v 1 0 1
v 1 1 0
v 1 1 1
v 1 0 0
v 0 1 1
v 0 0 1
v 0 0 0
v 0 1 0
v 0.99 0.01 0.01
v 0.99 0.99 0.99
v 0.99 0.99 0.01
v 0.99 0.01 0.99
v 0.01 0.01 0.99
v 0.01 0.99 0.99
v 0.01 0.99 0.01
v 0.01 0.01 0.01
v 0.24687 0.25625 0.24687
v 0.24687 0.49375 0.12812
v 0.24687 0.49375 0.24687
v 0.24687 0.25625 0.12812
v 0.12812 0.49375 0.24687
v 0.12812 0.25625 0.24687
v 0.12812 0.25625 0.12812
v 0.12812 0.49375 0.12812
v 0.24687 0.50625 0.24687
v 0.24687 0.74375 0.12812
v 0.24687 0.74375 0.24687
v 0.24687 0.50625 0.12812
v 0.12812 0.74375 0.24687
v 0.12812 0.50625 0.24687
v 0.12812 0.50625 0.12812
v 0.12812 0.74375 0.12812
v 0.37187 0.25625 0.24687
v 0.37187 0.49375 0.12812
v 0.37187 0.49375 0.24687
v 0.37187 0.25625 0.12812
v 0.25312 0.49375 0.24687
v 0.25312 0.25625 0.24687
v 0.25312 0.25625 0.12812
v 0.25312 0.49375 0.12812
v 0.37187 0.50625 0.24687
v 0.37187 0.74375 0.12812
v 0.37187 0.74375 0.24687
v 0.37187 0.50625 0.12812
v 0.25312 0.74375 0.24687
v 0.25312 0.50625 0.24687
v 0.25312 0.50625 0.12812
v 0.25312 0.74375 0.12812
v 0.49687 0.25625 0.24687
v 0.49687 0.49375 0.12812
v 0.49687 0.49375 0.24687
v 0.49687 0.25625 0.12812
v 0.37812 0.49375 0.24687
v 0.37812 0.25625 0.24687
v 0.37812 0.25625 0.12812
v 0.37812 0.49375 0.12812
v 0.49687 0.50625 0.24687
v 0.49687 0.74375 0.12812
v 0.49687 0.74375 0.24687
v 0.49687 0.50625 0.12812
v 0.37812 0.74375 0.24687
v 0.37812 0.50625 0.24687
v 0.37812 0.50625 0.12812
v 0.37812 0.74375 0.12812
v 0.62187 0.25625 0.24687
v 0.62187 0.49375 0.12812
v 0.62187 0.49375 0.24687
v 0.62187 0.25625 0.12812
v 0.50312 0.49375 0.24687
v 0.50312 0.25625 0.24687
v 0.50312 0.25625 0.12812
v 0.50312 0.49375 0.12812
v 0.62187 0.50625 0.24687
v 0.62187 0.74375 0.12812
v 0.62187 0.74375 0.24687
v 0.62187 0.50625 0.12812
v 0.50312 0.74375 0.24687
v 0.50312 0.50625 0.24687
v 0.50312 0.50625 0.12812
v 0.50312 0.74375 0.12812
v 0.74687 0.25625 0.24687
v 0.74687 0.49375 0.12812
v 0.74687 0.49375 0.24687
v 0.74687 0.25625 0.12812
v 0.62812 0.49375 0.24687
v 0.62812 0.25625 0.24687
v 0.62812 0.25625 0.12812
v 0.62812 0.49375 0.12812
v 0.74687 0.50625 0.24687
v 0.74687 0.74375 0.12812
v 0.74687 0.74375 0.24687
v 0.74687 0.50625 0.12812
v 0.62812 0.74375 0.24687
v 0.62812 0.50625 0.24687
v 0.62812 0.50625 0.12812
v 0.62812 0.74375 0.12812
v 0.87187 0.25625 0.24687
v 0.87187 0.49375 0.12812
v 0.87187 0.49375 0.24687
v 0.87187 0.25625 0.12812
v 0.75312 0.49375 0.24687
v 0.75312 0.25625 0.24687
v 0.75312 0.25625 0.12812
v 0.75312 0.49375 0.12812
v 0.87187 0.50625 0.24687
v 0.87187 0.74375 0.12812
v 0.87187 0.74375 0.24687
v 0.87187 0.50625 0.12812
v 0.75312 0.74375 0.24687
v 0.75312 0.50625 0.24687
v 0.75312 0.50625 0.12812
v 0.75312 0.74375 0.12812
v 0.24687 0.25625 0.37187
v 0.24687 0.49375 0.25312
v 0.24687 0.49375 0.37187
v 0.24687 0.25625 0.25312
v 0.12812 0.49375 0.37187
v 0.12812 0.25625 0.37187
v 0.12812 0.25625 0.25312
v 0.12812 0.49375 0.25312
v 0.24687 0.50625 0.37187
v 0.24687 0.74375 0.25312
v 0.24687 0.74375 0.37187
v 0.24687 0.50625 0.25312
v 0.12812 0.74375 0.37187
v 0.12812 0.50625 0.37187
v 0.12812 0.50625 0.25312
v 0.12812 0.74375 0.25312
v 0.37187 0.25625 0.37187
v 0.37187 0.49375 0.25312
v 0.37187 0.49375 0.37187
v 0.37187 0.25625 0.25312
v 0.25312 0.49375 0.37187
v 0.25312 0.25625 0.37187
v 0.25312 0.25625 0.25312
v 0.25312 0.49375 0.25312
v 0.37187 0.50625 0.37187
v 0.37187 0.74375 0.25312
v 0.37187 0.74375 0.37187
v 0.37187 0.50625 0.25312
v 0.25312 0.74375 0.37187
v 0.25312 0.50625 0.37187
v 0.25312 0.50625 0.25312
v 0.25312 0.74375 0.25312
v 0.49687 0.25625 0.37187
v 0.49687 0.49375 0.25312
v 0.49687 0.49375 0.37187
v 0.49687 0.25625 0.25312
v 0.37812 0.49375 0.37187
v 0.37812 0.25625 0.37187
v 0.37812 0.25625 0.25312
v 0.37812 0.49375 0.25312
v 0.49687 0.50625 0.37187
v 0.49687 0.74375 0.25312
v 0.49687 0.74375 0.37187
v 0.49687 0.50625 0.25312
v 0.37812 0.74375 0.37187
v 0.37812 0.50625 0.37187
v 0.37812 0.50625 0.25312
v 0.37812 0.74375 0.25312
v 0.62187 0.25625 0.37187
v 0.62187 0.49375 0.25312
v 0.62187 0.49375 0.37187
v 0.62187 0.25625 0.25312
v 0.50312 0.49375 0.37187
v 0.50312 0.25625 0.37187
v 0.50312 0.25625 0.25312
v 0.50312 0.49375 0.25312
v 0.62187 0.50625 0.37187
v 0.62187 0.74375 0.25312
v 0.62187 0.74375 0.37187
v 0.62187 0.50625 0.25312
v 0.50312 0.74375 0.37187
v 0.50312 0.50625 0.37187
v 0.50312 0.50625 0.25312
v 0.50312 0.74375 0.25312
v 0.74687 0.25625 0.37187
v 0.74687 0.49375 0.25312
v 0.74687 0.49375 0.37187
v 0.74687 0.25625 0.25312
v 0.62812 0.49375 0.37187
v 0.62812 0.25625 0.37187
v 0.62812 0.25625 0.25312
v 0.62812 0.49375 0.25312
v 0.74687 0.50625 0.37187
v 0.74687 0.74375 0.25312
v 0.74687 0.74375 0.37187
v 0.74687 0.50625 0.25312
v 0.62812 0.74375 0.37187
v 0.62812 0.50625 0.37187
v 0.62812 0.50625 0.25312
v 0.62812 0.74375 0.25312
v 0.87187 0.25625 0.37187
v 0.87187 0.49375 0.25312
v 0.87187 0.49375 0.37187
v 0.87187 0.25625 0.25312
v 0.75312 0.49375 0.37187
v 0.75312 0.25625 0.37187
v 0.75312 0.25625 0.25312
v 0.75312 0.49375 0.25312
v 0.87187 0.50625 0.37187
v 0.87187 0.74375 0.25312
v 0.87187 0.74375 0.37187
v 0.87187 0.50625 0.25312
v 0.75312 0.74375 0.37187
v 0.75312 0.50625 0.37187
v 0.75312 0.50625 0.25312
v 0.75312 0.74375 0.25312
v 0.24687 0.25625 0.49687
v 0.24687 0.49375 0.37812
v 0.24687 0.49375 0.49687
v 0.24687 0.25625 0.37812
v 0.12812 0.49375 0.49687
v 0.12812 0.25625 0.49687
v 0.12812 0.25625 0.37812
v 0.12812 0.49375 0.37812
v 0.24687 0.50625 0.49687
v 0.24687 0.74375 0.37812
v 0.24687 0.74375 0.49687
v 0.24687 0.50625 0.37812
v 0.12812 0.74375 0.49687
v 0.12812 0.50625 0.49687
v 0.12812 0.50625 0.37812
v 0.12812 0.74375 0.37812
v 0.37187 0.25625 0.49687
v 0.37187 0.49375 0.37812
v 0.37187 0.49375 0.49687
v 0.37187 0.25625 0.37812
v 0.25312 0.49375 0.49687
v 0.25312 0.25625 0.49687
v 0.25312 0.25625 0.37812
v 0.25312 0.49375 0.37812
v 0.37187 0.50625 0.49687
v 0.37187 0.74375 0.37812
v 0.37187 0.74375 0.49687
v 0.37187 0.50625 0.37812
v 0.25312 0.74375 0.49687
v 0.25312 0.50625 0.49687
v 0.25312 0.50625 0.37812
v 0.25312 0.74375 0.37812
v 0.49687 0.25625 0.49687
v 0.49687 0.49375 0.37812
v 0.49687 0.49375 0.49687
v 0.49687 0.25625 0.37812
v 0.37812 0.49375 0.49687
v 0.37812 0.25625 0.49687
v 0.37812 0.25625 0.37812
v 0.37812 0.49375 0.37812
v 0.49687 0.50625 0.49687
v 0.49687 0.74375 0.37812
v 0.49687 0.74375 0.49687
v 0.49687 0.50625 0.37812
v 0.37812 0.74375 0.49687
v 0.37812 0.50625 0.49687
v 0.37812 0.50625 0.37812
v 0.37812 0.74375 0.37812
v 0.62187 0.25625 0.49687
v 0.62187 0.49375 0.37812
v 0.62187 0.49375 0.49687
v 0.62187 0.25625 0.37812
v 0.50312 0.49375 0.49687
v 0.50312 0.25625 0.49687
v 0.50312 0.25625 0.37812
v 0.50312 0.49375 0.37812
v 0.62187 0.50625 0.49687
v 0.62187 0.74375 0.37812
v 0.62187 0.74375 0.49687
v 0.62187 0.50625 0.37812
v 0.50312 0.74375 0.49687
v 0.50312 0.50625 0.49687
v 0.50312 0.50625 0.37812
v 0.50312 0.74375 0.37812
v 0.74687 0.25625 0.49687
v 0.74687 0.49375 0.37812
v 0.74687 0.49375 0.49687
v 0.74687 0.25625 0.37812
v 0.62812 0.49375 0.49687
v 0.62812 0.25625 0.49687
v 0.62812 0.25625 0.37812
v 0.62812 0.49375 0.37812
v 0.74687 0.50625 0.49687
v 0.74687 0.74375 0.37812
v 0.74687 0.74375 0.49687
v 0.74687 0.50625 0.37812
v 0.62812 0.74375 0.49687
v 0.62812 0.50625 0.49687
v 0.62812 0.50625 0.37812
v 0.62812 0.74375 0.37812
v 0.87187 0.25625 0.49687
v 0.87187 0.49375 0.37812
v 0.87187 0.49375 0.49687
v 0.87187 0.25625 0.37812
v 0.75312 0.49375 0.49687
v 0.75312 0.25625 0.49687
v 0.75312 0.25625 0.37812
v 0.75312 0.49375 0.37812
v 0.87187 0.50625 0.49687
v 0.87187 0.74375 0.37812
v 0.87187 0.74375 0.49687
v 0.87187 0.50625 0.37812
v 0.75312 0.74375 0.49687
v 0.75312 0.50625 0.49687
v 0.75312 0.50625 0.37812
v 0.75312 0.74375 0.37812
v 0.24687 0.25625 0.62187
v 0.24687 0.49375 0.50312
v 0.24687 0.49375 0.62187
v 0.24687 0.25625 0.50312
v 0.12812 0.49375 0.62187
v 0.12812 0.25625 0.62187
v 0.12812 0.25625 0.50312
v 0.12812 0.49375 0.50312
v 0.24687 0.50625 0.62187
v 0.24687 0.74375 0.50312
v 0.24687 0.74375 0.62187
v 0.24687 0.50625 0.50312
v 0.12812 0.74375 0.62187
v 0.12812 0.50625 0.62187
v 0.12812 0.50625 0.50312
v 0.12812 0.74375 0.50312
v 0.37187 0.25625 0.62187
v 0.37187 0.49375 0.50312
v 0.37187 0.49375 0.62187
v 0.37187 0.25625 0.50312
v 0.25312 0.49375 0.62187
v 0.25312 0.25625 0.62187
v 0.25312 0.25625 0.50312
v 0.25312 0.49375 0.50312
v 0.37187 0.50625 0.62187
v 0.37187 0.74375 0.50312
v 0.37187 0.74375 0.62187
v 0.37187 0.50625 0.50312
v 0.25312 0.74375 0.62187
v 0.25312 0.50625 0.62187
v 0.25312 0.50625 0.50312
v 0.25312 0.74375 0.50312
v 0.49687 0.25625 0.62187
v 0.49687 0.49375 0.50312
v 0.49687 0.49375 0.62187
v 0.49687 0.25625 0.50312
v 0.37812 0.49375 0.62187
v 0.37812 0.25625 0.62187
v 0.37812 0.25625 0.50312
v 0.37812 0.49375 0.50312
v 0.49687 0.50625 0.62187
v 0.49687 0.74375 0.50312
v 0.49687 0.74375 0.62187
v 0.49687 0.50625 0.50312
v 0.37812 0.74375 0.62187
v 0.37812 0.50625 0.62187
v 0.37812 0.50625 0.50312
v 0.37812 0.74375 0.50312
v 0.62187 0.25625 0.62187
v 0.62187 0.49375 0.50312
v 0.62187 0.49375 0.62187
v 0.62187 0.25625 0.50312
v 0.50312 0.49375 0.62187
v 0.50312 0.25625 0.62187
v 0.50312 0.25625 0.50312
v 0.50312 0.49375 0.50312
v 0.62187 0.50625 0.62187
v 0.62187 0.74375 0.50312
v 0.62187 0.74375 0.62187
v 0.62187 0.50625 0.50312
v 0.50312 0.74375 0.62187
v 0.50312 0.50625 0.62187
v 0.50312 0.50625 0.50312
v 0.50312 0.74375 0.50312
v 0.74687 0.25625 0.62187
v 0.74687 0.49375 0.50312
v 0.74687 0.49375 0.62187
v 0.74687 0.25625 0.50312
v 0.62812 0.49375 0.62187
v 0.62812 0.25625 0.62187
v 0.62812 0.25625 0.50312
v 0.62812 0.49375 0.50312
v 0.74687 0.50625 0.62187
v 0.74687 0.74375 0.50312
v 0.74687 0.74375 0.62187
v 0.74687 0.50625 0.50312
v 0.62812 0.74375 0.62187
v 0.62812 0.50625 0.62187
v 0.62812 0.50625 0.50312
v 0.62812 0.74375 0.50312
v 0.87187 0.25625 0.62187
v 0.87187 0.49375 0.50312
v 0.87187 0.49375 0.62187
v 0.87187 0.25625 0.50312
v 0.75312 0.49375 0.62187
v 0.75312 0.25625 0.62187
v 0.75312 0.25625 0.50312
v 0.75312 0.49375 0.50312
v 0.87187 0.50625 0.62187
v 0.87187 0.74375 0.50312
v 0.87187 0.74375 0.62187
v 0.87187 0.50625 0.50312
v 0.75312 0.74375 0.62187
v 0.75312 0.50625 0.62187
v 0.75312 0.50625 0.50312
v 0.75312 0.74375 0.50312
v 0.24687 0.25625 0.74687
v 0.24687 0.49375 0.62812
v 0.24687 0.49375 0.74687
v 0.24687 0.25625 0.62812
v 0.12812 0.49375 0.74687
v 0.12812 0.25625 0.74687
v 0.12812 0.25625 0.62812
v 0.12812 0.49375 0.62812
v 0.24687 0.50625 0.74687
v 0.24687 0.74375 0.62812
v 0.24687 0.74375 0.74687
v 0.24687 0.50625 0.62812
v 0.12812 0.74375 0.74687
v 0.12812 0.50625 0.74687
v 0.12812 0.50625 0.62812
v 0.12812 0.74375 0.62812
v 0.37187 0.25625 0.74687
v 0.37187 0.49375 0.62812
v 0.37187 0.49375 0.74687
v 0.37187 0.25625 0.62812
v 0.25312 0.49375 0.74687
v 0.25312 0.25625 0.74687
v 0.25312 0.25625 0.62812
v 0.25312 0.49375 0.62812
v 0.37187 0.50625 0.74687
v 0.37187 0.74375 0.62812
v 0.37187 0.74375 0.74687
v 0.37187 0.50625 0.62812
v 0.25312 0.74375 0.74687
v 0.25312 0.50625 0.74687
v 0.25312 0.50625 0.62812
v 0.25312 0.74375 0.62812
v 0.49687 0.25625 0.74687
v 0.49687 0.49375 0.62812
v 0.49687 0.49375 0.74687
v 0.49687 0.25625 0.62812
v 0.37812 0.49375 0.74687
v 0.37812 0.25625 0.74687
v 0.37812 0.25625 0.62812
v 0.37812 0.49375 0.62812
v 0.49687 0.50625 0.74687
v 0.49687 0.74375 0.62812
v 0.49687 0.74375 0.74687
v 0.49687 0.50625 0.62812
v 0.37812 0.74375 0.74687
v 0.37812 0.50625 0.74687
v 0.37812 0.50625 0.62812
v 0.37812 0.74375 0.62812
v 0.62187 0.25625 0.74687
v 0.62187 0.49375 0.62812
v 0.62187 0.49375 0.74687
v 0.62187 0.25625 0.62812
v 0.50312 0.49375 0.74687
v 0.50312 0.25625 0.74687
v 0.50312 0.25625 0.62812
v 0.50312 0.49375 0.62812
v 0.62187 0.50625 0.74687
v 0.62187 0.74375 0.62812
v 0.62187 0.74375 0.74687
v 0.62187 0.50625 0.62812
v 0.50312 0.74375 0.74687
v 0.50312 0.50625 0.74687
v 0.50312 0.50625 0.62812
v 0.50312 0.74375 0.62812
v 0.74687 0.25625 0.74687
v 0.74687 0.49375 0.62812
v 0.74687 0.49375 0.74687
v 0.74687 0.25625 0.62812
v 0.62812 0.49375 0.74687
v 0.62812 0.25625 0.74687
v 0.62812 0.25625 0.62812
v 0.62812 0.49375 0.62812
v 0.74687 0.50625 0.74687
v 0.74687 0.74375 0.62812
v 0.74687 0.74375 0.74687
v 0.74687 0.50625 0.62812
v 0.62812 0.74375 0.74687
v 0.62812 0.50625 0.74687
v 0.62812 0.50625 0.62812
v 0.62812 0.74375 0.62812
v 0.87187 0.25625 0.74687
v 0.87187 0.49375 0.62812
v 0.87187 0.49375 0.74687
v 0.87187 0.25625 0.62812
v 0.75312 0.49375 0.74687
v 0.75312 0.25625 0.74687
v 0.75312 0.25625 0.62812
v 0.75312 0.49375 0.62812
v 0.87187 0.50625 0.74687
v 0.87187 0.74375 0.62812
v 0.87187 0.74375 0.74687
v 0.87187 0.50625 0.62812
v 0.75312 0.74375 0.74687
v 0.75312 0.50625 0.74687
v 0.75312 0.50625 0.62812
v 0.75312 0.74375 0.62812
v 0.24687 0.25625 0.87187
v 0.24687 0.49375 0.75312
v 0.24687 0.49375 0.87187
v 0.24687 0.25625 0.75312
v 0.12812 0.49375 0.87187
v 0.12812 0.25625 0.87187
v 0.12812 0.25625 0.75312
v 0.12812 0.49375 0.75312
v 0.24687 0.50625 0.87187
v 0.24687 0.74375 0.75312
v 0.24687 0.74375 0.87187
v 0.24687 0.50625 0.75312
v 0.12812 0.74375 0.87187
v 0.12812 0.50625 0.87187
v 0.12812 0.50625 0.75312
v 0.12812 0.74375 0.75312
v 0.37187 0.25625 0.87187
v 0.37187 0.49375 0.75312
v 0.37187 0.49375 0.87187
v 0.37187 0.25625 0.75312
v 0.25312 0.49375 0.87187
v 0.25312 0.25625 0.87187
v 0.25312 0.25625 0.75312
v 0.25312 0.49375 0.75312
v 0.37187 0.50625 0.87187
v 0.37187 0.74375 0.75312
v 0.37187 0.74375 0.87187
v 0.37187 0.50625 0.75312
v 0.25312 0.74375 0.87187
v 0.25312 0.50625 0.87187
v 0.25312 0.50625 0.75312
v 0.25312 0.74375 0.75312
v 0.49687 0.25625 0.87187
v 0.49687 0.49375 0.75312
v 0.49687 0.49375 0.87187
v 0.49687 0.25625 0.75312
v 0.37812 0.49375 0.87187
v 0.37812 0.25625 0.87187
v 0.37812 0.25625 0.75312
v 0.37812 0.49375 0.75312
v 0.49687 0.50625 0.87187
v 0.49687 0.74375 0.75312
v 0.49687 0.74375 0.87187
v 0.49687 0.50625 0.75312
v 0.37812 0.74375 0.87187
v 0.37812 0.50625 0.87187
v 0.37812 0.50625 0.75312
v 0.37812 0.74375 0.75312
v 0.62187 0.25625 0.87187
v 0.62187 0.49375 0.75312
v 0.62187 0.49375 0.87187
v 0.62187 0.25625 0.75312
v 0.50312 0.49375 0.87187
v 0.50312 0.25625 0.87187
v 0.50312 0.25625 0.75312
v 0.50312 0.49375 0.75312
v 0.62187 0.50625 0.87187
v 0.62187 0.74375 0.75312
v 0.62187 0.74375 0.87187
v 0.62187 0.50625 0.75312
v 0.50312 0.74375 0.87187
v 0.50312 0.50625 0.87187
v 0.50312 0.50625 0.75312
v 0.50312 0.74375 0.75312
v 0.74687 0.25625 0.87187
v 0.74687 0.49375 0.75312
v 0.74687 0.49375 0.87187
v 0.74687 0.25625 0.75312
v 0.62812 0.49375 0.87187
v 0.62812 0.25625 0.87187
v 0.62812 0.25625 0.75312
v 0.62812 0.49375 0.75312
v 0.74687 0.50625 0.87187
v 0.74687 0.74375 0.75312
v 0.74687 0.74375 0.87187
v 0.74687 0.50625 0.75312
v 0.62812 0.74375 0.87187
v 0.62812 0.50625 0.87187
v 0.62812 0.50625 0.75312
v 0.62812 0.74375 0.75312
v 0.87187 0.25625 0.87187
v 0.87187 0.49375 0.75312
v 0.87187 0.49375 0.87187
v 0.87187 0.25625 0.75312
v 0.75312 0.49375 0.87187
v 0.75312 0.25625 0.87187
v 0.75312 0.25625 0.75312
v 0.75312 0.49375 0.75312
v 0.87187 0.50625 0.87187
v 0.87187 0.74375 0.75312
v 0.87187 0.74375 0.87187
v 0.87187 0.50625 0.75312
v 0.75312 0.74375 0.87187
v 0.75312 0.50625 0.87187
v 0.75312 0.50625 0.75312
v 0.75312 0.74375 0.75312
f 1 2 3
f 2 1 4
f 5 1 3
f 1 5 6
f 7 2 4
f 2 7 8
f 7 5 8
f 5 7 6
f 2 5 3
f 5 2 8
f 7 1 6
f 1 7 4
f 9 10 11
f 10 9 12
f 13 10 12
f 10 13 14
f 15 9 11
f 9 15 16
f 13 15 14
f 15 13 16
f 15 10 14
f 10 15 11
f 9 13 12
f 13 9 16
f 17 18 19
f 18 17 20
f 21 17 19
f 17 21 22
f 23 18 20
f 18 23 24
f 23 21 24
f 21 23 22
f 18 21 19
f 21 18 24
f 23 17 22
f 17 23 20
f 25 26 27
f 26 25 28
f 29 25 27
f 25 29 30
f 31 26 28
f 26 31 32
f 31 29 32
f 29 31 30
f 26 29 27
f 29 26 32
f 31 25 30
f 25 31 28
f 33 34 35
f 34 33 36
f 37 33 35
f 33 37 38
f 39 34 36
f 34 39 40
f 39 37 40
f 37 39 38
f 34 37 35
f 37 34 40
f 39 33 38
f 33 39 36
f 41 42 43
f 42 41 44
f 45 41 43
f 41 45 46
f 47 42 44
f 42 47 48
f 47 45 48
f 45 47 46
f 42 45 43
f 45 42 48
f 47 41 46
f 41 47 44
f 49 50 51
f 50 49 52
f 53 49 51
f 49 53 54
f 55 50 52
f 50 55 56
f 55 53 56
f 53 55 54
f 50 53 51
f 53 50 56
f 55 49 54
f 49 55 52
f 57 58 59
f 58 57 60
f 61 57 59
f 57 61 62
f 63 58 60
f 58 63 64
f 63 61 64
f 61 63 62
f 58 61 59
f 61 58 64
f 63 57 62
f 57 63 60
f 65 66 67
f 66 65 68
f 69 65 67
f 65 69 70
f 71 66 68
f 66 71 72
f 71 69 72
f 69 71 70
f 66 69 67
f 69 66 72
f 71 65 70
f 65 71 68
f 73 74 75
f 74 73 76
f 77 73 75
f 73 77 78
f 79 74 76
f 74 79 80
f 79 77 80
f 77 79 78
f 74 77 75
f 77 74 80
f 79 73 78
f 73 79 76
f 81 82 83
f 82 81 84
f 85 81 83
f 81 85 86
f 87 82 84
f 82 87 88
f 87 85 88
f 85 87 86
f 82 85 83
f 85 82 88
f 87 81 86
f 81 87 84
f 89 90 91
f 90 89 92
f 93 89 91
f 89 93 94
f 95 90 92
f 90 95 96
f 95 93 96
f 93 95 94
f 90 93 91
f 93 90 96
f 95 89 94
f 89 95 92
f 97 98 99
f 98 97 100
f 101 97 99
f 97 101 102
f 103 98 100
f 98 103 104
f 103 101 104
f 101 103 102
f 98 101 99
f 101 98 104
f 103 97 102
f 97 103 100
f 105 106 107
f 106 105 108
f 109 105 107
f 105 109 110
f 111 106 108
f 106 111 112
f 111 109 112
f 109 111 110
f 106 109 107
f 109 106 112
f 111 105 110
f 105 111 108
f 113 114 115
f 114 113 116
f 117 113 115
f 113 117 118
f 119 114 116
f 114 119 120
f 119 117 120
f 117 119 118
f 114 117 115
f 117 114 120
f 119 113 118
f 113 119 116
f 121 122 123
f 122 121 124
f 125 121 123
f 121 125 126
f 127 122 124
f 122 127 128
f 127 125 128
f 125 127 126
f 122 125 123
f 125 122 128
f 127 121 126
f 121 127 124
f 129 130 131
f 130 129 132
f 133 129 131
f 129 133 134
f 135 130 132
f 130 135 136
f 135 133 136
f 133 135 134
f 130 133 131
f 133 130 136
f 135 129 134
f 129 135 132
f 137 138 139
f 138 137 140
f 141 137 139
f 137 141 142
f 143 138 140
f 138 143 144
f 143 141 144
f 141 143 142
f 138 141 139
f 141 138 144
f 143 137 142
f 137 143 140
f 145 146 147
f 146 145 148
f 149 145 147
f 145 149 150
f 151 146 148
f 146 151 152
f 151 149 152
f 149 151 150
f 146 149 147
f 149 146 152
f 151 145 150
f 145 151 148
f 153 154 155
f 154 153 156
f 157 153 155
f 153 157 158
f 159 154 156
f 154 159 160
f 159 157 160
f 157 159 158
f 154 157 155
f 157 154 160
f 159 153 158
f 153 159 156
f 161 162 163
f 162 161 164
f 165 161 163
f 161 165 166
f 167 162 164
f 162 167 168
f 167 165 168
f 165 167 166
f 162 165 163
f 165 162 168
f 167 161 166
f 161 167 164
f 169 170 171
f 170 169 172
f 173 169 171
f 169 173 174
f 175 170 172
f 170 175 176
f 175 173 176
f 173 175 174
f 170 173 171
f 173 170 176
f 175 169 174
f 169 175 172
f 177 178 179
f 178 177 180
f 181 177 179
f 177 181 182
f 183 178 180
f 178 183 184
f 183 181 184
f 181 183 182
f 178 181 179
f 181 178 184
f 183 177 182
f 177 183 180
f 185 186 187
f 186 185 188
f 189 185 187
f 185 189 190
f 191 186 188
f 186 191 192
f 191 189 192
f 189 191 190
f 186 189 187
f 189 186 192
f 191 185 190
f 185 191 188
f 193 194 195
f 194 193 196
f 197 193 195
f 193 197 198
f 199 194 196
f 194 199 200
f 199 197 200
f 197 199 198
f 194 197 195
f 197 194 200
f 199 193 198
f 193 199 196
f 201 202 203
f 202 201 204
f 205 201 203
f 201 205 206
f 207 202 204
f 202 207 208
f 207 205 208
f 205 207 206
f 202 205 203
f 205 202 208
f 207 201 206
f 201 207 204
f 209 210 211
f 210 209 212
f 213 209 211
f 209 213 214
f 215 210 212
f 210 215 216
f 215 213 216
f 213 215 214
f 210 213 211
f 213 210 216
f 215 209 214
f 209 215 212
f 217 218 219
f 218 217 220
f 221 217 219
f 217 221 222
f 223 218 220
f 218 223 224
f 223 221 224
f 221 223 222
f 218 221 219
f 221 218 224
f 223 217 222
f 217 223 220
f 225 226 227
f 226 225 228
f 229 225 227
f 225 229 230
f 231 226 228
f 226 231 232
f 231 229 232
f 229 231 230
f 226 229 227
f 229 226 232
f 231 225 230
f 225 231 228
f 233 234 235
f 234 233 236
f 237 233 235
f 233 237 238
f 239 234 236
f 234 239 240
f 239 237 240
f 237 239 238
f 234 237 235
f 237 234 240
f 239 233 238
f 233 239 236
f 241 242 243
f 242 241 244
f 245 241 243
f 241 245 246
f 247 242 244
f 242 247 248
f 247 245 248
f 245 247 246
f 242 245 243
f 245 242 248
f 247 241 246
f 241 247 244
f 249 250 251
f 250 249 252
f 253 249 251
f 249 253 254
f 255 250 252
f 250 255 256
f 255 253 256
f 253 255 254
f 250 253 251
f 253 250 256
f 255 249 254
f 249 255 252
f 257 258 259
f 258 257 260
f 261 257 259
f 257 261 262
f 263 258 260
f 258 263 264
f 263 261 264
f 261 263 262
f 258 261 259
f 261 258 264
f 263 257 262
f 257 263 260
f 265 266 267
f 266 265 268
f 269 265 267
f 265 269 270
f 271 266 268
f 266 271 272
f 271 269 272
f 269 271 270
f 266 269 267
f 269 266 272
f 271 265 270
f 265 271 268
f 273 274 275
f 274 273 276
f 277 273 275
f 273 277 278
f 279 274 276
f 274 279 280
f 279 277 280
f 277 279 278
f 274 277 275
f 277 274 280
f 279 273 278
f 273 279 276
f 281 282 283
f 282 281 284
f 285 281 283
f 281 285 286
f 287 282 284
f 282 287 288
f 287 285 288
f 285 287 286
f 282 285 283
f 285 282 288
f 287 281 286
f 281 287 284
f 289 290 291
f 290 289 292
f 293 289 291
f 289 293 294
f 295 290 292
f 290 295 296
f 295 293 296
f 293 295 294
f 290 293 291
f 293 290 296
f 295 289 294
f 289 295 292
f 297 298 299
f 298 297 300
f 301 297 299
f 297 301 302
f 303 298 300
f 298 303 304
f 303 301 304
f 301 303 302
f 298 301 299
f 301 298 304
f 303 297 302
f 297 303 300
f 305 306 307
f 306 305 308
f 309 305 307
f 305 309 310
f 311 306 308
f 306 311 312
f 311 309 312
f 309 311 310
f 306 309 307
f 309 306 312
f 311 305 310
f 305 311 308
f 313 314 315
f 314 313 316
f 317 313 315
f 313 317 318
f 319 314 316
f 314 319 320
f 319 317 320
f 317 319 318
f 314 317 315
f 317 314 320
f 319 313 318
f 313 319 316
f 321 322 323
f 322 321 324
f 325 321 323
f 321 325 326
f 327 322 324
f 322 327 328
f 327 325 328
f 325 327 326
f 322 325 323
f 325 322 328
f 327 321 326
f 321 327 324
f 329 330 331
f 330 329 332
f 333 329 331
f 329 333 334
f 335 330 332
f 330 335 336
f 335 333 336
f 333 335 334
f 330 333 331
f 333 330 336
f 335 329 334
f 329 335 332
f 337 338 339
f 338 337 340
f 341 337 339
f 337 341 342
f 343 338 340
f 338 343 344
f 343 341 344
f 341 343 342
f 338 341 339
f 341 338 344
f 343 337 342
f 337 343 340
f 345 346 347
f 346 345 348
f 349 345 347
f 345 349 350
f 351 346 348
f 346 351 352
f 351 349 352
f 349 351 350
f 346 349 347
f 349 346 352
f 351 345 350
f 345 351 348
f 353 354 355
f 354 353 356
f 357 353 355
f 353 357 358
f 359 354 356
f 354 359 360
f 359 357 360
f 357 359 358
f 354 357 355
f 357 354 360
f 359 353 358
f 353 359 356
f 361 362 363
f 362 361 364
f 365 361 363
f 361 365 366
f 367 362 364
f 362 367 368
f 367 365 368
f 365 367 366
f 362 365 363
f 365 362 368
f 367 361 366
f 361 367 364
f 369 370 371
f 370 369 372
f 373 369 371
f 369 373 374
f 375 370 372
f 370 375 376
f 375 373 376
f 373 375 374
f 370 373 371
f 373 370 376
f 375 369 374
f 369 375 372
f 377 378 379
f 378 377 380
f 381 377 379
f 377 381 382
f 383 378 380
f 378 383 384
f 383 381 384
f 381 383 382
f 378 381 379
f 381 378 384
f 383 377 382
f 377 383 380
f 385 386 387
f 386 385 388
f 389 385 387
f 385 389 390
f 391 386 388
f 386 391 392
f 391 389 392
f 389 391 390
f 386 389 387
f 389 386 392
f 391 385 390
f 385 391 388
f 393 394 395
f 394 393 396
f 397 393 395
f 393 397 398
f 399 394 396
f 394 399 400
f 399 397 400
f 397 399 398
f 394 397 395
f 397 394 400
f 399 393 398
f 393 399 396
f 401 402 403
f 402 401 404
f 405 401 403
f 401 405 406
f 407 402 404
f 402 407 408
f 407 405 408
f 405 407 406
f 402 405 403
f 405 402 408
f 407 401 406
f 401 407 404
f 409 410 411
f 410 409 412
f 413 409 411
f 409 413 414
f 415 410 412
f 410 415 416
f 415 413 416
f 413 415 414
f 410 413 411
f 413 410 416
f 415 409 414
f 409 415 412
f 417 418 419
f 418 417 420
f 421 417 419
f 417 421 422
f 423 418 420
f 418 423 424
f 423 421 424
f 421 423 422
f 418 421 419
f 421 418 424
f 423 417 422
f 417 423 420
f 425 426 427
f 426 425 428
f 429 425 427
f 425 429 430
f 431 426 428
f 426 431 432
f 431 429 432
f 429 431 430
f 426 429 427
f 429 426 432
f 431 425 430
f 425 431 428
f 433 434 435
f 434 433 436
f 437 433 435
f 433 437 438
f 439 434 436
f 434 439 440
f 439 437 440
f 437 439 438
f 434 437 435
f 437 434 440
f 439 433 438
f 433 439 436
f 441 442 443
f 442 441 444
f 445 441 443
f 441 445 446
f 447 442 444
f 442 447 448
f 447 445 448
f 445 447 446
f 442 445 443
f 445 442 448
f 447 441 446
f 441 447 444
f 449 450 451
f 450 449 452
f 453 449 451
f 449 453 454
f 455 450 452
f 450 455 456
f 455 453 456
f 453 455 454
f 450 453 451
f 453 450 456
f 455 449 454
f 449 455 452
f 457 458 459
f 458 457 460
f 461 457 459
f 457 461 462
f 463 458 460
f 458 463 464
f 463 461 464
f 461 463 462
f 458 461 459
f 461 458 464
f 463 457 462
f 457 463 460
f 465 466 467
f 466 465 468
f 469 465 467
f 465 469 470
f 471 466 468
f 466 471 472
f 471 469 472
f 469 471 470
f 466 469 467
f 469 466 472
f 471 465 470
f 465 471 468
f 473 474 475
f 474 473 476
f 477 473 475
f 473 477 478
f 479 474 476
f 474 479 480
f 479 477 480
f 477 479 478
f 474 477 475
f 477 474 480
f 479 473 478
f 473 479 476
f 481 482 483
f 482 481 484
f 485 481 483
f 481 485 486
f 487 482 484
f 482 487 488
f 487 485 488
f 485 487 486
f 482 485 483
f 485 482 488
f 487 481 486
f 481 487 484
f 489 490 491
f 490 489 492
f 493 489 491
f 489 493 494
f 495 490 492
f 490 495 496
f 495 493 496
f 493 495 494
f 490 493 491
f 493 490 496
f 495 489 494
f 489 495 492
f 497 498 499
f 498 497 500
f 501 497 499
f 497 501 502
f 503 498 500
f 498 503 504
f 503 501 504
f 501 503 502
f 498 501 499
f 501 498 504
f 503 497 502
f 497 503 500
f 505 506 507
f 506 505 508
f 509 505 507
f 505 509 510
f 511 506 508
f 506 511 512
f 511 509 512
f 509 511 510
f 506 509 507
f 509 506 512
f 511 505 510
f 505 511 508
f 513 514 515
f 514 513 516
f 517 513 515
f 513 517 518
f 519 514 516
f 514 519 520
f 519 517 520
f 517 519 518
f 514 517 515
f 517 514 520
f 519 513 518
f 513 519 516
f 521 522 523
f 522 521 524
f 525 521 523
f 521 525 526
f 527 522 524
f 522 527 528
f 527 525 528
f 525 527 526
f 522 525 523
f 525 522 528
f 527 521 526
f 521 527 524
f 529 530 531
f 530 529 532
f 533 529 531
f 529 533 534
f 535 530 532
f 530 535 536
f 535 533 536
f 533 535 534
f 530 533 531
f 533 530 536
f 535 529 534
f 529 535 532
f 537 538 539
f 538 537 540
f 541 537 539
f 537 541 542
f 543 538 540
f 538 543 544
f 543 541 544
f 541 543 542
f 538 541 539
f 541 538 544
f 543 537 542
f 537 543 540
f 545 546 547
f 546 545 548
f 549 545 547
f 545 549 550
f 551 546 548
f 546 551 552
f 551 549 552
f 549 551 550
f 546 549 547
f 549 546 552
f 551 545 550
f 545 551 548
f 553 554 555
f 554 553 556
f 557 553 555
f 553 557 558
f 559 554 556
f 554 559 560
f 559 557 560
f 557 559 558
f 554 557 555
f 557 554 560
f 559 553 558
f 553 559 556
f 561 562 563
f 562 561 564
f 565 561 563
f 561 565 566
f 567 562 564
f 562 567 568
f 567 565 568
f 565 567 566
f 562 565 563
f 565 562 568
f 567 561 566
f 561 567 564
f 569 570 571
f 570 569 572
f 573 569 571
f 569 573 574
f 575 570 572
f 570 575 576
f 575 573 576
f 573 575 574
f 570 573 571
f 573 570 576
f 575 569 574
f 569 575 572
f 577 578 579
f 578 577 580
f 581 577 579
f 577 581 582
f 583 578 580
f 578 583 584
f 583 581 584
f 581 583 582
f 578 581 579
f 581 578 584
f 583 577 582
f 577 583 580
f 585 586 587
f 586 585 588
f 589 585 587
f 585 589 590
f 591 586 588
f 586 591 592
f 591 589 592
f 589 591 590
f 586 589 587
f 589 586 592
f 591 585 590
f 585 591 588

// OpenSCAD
translate([0.1875, 0.375, 0.1875]) color([0.5839405385485582, 0.4048698908705002, 0.6877557316706271]) cube([0.11875, 0.2375, 0.11875], center=true);
translate([0.1875, 0.625, 0.1875]) color([0.29310936231965135, 0.08456113000314536, 0.6409271470126323]) cube([0.11875, 0.2375, 0.11875], center=true);
translate([0.3125, 0.375, 0.1875]) color([0.38512246522478266, 0.6162859510128613, 0.407224705538046]) cube([0.11875, 0.2375, 0.11875], center=true);
translate([0.3125, 0.625, 0.1875]) color([0.6107800780239486, 0.9541913078580654, 0.09369719926319908]) cube([0.11875, 0.2375, 0.11875], center=true);
translate([0.4375, 0.375, 0.1875]) color([0.4396226851829427, 0.9817497074141792, 0.30111933510979894]) cube([0.11875, 0.2375, 0.11875], center=true);
translate([0.4375, 0.625, 0.1875]) color([0.08571041628526821, 0.691130580335744, 0.16573157374072334]) cube([0.11875, 0.2375, 0.11875], center=true);
translate([0.5625, 0.375, 0.1875]) color([0.4668304924867862, 0.30100213617539295, 0.3511677492745029]) cube([0.11875, 0.2375, 0.11875], center=true);
translate([0.5625, 0.625, 0.1875]) color([0.05564944269037686, 0.7696481469448815, 0.686275624239137]) cube([0.11875, 0.2375, 0.11875], center=true);
translate([0.6875, 0.375, 0.1875]) color([0.15447252119296884, 0.35335085758162643, 0.18799175914388588]) cube([0.11875, 0.2375, 0.11875], center=true);
translate([0.6875, 0.625, 0.1875]) color([0.41322879780265653, 0.82270842281296, 0.9057146612667819]) cube([0.11875, 0.2375, 0.11875], center=true);
translate([0.8125, 0.375, 0.1875]) color([0.9688547633127277, 0.5528378273263655, 0.12760284187612392]) cube([0.11875, 0.2375, 0.11875], center=true);
translate([0.8125, 0.625, 0.1875]) color([0.1710979555253146, 0.7131998843266452, 0.6397779425125977]) cube([0.11875, 0.2375, 0.11875], center=true);
translate([0.1875, 0.375, 0.3125]) color([0.57496968906483, 0.8489371230716904, 0.07944838941339594]) cube([0.11875, 0.2375, 0.11875], center=true);
translate([0.1875, 0.625, 0.3125]) color([0.040333123224873146, 0.9305910632054132, 0.3080440975445232]) cube([0.11875, 0.2375, 0.11875], center=true);
translate([0.3125, 0.375, 0.3125]) color([0.6084655882345898, 0.4923441190446234, 0.7069385087242315]) cube([0.11875, 0.2375, 0.11875], center=true);
translate([0.3125, 0.625, 0.3125]) color([0.6803385961846494, 0.18024793645131376, 0.10787678186317007]) cube([0.11875, 0.2375, 0.11875], center=true);
translate([0.4375, 0.375, 0.3125]) color([0.1335624130282893, 0.47731112778056706, 0.8393950916733898]) cube([0.11875, 0.2375, 0.11875], center=true);
translate([0.4375, 0.625, 0.3125]) color([0.6780893207968227, 0.08337096158279222, 0.27725115680544954]) cube([0.11875, 0.2375, 0.11875], center=true);
translate([0.5625, 0.375, 0.3125]) color([0.9965791662073833, 0.03375154870506614, 0.10494976972159242]) cube([0.11875, 0.2375, 0.11875], center=true);
translate([0.5625, 0.625, 0.3125]) color([0.516844917539197, 0.1360610465034362, 0.543805910213663]) cube([0.11875, 0.2375, 0.11875], center=true);
translate([0.6875, 0.375, 0.3125]) color([0.04901628196141694, 0.4867102513994055, 0.8813892002857401]) cube([0.11875, 0.2375, 0.11875], center=true);
translate([0.6875, 0.625, 0.3125]) color([0.3053751014353143, 0.40772022041766365, 0.31297204198076634]) cube([0.11875, 0.2375, 0.11875], center=true);
translate([0.8125, 0.375, 0.3125]) color([0.49907796034366436, 0.6160709555012981, 0.9916538905911245]) cube([0.11875, 0.2375, 0.11875], center=true);
translate([0.8125, 0.625, 0.3125]) color([0.3123575451593331, 0.46364206475662195, 0.8862899719975306]) cube([0.11875, 0.2375, 0.11875], center=true);
translate([0.1875, 0.375, 0.4375]) color([0.5738800220993816, 0.8494037217359881, 0.24323676398212035]) cube([0.11875, 0.2375, 0.11875], center=true);
translate([0.1875, 0.625, 0.4375]) color([0.8402878098664139, 0.9530478541805099, 0.16594803365564914]) cube([0.11875, 0.2375, 0.11875], center=true);
translate([0.3125, 0.375, 0.4375]) color([0.0023370868964924796, 0.7387895340607371, 0.5374530602666081]) cube([0.11875, 0.2375, 0.11875], center=true);
translate([0.3125, 0.625, 0.4375]) color([0.25604025835089217, 0.4320068924153808, 0.5112453323210508]) cube([0.11875, 0.2375, 0.11875], center=true);
translate([0.4375, 0.375, 0.4375]) color([0.7462272619347637, 0.5039790716190428, 0.8850839351693509]) cube([0.11875, 0.2375, 0.11875], center=true);
translate([0.4375, 0.625, 0.4375]) color([0.6652757233710683, 0.22263754843686523, 0.08942086350367451]) cube([0.11875, 0.2375, 0.11875], center=true);
translate([0.5625, 0.375, 0.4375]) color([0.6195232841458308, 0.9036720387350747, 0.7222923954673625]) cube([0.11875, 0.2375, 0.11875], center=true);
translate([0.5625, 0.625, 0.4375]) color([0.6665075097113882, 0.5421139713900744, 0.6943978877819516]) cube([0.11875, 0.2375, 0.11875], center=true);
translate([0.6875, 0.375, 0.4375]) color([0.9269770591996176, 0.12480324665016229, 0.8422397758241813]) cube([0.11875, 0.2375, 0.11875], center=true);
translate([0.6875, 0.625, 0.4375]) color([0.028249143050612435, 0.8554899328562455, 0.6212809598996976]) cube([0.11875, 0.2375, 0.11875], center=true);
translate([0.8125, 0.375, 0.4375]) color([0.6435486749275994, 0.4857227915978113, 0.2898251547629681]) cube([0.11875, 0.2375, 0.11875], center=true);
translate([0.8125, 0.625, 0.4375]) color([0.21709076393122206, 0.4979948584580751, 0.6176241526046676]) cube([0.11875, 0.2375, 0.11875], center=true);
translate([0.1875, 0.375, 0.5625]) color([0.4722249532281336, 0.7228331534363125, 0.6109414561657331]) cube([0.11875, 0.2375, 0.11875], center=true);
translate([0.1875, 0.625, 0.5625]) color([0.5330085163671737, 0.6769359871291822, 0.5973748769978083]) cube([0.11875, 0.2375, 0.11875], center=true);
translate([0.3125, 0.375, 0.5625]) color([0.14460255854654236, 0.21273280877313017, 0.8417179364881341]) cube([0.11875, 0.2375, 0.11875], center=true);
translate([0.3125, 0.625, 0.5625]) color([0.6300391880279899, 0.5103677782275869, 0.4479627161837708]) cube([0.11875, 0.2375, 0.11875], center=true);
translate([0.4375, 0.375, 0.5625]) color([0.2903518628620462, 0.1744676713524972, 0.5457372127765215]) cube([0.11875, 0.2375, 0.11875], center=true);
translate([0.4375, 0.625, 0.5625]) color([0.6340658375422632, 0.7004271366493812, 0.690956934786038]) cube([0.11875, 0.2375, 0.11875], center=true);
translate([0.5625, 0.375, 0.5625]) color([0.013948469234104865, 0.8018456354370093, 0.2607079205191076]) cube([0.11875, 0.2375, 0.11875], center=true);
translate([0.5625, 0.625, 0.5625]) color([0.01899716010339858, 0.7507132946374245, 0.44168653561511173]) cube([0.11875, 0.2375, 0.11875], center=true);
translate([0.6875, 0.375, 0.5625]) color([0.1668653701245908, 0.45955837321901094, 0.7876756969907556]) cube([0.11875, 0.2375, 0.11875], center=true);
translate([0.6875, 0.625, 0.5625]) color([0.09564527702692727, 0.06733136152719421, 0.7816649665975636]) cube([0.11875, 0.2375, 0.11875], center=true);
translate([0.8125, 0.375, 0.5625]) color([0.030385075649315252, 0.33346286891595733, 0.08647112242809318]) cube([0.11875, 0.2375, 0.11875], center=true);
translate([0.8125, 0.625, 0.5625]) color([0.8161439782233904, 0.05657658467482607, 0.8243668117903717]) cube([0.11875, 0.2375, 0.11875], center=true);
translate([0.1875, 0.375, 0.6875]) color([0.05808931884644186, 0.6181904095369413, 0.1426995958976538]) cube([0.11875, 0.2375, 0.11875], center=true);
translate([0.1875, 0.625, 0.6875]) color([0.3846464495954227, 0.3794414211645075, 0.7643773332264734]) cube([0.11875, 0.2375, 0.11875], center=true);
translate([0.3125, 0.375, 0.6875]) color([0.3116889002403487, 0.7690158776827113, 0.7674729074453902]) cube([0.11875, 0.2375, 0.11875], center=true);
translate([0.3125, 0.625, 0.6875]) color([0.3394448706328078, 0.45855440081433096, 0.0007502935671159783]) cube([0.11875, 0.2375, 0.11875], center=true);
translate([0.4375, 0.375, 0.6875]) color([0.8084995756647368, 0.0331322283588068, 0.9954935019736515]) cube([0.11875, 0.2375, 0.11875], center=true);
translate([0.4375, 0.625, 0.6875]) color([0.32750610520168044, 0.511786711221762, 0.09639677946248049]) cube([0.11875, 0.2375, 0.11875], center=true);
translate([0.5625, 0.375, 0.6875]) color([0.46647601470953737, 0.043404226035316795, 0.8089506697449751]) cube([0.11875, 0.2375, 0.11875], center=true);
translate([0.5625, 0.625, 0.6875]) color([0.9065579579370614, 0.48874197586323487, 0.4689182776921319]) cube([0.11875, 0.2375, 0.11875], center=true);
translate([0.6875, 0.375, 0.6875]) color([0.9999833648369341, 0.42392948264922625, 0.11056216143511133]) cube([0.11875, 0.2375, 0.11875], center=true);
translate([0.6875, 0.625, 0.6875]) color([0.5007484231317689, 0.23725843071495933, 0.7435751616565288]) cube([0.11875, 0.2375, 0.11875], center=true);
translate([0.8125, 0.375, 0.6875]) color([0.030326511183225713, 0.9534383365251057, 0.44454391677925087]) cube([0.11875, 0.2375, 0.11875], center=true);
translate([0.8125, 0.625, 0.6875]) color([0.4017260225039573, 0.6984802625757133, 0.14751428227125585]) cube([0.11875, 0.2375, 0.11875], center=true);
translate([0.1875, 0.375, 0.8125]) color([0.592053202978914, 0.7602792343344718, 0.23214841748979886]) cube([0.11875, 0.2375, 0.11875], center=true);
translate([0.1875, 0.625, 0.8125]) color([0.2215781656479593, 0.24536616409996503, 0.7021925659500807]) cube([0.11875, 0.2375, 0.11875], center=true);
translate([0.3125, 0.375, 0.8125]) color([0.5457605096294114, 0.54011508338913, 0.5459453680001618]) cube([0.11875, 0.2375, 0.11875], center=true);
translate([0.3125, 0.625, 0.8125]) color([0.21439919344985514, 0.4167057873106884, 0.6193494045718565]) cube([0.11875, 0.2375, 0.11875], center=true);
translate([0.4375, 0.375, 0.8125]) color([0.45760594266221877, 0.8933837090972113, 0.8109172526149769]) cube([0.11875, 0.2375, 0.11875], center=true);
translate([0.4375, 0.625, 0.8125]) color([0.14833972802097417, 0.6068004170768148, 0.5080529466064481]) cube([0.11875, 0.2375, 0.11875], center=true);
translate([0.5625, 0.375, 0.8125]) color([0.9906187087676633, 0.11352393843166497, 0.6883720652754897]) cube([0.11875, 0.2375, 0.11875], center=true);
translate([0.5625, 0.625, 0.8125]) color([0.5952346609945763, 0.6540807806784664, 0.3474259839548979]) cube([0.11875, 0.2375, 0.11875], center=true);
translate([0.6875, 0.375, 0.8125]) color([0.9928586924360654, 0.247192741454632, 0.70975753974483]) cube([0.11875, 0.2375, 0.11875], center=true);
translate([0.6875, 0.625, 0.8125]) color([0.13794757021236903, 0.4611444179186315, 0.04899626755467579]) cube([0.11875, 0.2375, 0.11875], center=true);
translate([0.8125, 0.375, 0.8125]) color([0.1977229983916683, 0.036370797334404625, 0.13840798504488894]) cube([0.11875, 0.2375, 0.11875], center=true);
translate([0.8125, 0.625, 0.8125]) color([0.695134065044521, 0.2654011745990712, 0.4635417367699751]) cube([0.11875, 0.2375, 0.11875], center=true);
color([0.3,0.3,0.3,0.3]) difference() { cube([1,1,1]); translate([0.01,0.01,0.01]) cube([0.98,0.98,0.98]); }
